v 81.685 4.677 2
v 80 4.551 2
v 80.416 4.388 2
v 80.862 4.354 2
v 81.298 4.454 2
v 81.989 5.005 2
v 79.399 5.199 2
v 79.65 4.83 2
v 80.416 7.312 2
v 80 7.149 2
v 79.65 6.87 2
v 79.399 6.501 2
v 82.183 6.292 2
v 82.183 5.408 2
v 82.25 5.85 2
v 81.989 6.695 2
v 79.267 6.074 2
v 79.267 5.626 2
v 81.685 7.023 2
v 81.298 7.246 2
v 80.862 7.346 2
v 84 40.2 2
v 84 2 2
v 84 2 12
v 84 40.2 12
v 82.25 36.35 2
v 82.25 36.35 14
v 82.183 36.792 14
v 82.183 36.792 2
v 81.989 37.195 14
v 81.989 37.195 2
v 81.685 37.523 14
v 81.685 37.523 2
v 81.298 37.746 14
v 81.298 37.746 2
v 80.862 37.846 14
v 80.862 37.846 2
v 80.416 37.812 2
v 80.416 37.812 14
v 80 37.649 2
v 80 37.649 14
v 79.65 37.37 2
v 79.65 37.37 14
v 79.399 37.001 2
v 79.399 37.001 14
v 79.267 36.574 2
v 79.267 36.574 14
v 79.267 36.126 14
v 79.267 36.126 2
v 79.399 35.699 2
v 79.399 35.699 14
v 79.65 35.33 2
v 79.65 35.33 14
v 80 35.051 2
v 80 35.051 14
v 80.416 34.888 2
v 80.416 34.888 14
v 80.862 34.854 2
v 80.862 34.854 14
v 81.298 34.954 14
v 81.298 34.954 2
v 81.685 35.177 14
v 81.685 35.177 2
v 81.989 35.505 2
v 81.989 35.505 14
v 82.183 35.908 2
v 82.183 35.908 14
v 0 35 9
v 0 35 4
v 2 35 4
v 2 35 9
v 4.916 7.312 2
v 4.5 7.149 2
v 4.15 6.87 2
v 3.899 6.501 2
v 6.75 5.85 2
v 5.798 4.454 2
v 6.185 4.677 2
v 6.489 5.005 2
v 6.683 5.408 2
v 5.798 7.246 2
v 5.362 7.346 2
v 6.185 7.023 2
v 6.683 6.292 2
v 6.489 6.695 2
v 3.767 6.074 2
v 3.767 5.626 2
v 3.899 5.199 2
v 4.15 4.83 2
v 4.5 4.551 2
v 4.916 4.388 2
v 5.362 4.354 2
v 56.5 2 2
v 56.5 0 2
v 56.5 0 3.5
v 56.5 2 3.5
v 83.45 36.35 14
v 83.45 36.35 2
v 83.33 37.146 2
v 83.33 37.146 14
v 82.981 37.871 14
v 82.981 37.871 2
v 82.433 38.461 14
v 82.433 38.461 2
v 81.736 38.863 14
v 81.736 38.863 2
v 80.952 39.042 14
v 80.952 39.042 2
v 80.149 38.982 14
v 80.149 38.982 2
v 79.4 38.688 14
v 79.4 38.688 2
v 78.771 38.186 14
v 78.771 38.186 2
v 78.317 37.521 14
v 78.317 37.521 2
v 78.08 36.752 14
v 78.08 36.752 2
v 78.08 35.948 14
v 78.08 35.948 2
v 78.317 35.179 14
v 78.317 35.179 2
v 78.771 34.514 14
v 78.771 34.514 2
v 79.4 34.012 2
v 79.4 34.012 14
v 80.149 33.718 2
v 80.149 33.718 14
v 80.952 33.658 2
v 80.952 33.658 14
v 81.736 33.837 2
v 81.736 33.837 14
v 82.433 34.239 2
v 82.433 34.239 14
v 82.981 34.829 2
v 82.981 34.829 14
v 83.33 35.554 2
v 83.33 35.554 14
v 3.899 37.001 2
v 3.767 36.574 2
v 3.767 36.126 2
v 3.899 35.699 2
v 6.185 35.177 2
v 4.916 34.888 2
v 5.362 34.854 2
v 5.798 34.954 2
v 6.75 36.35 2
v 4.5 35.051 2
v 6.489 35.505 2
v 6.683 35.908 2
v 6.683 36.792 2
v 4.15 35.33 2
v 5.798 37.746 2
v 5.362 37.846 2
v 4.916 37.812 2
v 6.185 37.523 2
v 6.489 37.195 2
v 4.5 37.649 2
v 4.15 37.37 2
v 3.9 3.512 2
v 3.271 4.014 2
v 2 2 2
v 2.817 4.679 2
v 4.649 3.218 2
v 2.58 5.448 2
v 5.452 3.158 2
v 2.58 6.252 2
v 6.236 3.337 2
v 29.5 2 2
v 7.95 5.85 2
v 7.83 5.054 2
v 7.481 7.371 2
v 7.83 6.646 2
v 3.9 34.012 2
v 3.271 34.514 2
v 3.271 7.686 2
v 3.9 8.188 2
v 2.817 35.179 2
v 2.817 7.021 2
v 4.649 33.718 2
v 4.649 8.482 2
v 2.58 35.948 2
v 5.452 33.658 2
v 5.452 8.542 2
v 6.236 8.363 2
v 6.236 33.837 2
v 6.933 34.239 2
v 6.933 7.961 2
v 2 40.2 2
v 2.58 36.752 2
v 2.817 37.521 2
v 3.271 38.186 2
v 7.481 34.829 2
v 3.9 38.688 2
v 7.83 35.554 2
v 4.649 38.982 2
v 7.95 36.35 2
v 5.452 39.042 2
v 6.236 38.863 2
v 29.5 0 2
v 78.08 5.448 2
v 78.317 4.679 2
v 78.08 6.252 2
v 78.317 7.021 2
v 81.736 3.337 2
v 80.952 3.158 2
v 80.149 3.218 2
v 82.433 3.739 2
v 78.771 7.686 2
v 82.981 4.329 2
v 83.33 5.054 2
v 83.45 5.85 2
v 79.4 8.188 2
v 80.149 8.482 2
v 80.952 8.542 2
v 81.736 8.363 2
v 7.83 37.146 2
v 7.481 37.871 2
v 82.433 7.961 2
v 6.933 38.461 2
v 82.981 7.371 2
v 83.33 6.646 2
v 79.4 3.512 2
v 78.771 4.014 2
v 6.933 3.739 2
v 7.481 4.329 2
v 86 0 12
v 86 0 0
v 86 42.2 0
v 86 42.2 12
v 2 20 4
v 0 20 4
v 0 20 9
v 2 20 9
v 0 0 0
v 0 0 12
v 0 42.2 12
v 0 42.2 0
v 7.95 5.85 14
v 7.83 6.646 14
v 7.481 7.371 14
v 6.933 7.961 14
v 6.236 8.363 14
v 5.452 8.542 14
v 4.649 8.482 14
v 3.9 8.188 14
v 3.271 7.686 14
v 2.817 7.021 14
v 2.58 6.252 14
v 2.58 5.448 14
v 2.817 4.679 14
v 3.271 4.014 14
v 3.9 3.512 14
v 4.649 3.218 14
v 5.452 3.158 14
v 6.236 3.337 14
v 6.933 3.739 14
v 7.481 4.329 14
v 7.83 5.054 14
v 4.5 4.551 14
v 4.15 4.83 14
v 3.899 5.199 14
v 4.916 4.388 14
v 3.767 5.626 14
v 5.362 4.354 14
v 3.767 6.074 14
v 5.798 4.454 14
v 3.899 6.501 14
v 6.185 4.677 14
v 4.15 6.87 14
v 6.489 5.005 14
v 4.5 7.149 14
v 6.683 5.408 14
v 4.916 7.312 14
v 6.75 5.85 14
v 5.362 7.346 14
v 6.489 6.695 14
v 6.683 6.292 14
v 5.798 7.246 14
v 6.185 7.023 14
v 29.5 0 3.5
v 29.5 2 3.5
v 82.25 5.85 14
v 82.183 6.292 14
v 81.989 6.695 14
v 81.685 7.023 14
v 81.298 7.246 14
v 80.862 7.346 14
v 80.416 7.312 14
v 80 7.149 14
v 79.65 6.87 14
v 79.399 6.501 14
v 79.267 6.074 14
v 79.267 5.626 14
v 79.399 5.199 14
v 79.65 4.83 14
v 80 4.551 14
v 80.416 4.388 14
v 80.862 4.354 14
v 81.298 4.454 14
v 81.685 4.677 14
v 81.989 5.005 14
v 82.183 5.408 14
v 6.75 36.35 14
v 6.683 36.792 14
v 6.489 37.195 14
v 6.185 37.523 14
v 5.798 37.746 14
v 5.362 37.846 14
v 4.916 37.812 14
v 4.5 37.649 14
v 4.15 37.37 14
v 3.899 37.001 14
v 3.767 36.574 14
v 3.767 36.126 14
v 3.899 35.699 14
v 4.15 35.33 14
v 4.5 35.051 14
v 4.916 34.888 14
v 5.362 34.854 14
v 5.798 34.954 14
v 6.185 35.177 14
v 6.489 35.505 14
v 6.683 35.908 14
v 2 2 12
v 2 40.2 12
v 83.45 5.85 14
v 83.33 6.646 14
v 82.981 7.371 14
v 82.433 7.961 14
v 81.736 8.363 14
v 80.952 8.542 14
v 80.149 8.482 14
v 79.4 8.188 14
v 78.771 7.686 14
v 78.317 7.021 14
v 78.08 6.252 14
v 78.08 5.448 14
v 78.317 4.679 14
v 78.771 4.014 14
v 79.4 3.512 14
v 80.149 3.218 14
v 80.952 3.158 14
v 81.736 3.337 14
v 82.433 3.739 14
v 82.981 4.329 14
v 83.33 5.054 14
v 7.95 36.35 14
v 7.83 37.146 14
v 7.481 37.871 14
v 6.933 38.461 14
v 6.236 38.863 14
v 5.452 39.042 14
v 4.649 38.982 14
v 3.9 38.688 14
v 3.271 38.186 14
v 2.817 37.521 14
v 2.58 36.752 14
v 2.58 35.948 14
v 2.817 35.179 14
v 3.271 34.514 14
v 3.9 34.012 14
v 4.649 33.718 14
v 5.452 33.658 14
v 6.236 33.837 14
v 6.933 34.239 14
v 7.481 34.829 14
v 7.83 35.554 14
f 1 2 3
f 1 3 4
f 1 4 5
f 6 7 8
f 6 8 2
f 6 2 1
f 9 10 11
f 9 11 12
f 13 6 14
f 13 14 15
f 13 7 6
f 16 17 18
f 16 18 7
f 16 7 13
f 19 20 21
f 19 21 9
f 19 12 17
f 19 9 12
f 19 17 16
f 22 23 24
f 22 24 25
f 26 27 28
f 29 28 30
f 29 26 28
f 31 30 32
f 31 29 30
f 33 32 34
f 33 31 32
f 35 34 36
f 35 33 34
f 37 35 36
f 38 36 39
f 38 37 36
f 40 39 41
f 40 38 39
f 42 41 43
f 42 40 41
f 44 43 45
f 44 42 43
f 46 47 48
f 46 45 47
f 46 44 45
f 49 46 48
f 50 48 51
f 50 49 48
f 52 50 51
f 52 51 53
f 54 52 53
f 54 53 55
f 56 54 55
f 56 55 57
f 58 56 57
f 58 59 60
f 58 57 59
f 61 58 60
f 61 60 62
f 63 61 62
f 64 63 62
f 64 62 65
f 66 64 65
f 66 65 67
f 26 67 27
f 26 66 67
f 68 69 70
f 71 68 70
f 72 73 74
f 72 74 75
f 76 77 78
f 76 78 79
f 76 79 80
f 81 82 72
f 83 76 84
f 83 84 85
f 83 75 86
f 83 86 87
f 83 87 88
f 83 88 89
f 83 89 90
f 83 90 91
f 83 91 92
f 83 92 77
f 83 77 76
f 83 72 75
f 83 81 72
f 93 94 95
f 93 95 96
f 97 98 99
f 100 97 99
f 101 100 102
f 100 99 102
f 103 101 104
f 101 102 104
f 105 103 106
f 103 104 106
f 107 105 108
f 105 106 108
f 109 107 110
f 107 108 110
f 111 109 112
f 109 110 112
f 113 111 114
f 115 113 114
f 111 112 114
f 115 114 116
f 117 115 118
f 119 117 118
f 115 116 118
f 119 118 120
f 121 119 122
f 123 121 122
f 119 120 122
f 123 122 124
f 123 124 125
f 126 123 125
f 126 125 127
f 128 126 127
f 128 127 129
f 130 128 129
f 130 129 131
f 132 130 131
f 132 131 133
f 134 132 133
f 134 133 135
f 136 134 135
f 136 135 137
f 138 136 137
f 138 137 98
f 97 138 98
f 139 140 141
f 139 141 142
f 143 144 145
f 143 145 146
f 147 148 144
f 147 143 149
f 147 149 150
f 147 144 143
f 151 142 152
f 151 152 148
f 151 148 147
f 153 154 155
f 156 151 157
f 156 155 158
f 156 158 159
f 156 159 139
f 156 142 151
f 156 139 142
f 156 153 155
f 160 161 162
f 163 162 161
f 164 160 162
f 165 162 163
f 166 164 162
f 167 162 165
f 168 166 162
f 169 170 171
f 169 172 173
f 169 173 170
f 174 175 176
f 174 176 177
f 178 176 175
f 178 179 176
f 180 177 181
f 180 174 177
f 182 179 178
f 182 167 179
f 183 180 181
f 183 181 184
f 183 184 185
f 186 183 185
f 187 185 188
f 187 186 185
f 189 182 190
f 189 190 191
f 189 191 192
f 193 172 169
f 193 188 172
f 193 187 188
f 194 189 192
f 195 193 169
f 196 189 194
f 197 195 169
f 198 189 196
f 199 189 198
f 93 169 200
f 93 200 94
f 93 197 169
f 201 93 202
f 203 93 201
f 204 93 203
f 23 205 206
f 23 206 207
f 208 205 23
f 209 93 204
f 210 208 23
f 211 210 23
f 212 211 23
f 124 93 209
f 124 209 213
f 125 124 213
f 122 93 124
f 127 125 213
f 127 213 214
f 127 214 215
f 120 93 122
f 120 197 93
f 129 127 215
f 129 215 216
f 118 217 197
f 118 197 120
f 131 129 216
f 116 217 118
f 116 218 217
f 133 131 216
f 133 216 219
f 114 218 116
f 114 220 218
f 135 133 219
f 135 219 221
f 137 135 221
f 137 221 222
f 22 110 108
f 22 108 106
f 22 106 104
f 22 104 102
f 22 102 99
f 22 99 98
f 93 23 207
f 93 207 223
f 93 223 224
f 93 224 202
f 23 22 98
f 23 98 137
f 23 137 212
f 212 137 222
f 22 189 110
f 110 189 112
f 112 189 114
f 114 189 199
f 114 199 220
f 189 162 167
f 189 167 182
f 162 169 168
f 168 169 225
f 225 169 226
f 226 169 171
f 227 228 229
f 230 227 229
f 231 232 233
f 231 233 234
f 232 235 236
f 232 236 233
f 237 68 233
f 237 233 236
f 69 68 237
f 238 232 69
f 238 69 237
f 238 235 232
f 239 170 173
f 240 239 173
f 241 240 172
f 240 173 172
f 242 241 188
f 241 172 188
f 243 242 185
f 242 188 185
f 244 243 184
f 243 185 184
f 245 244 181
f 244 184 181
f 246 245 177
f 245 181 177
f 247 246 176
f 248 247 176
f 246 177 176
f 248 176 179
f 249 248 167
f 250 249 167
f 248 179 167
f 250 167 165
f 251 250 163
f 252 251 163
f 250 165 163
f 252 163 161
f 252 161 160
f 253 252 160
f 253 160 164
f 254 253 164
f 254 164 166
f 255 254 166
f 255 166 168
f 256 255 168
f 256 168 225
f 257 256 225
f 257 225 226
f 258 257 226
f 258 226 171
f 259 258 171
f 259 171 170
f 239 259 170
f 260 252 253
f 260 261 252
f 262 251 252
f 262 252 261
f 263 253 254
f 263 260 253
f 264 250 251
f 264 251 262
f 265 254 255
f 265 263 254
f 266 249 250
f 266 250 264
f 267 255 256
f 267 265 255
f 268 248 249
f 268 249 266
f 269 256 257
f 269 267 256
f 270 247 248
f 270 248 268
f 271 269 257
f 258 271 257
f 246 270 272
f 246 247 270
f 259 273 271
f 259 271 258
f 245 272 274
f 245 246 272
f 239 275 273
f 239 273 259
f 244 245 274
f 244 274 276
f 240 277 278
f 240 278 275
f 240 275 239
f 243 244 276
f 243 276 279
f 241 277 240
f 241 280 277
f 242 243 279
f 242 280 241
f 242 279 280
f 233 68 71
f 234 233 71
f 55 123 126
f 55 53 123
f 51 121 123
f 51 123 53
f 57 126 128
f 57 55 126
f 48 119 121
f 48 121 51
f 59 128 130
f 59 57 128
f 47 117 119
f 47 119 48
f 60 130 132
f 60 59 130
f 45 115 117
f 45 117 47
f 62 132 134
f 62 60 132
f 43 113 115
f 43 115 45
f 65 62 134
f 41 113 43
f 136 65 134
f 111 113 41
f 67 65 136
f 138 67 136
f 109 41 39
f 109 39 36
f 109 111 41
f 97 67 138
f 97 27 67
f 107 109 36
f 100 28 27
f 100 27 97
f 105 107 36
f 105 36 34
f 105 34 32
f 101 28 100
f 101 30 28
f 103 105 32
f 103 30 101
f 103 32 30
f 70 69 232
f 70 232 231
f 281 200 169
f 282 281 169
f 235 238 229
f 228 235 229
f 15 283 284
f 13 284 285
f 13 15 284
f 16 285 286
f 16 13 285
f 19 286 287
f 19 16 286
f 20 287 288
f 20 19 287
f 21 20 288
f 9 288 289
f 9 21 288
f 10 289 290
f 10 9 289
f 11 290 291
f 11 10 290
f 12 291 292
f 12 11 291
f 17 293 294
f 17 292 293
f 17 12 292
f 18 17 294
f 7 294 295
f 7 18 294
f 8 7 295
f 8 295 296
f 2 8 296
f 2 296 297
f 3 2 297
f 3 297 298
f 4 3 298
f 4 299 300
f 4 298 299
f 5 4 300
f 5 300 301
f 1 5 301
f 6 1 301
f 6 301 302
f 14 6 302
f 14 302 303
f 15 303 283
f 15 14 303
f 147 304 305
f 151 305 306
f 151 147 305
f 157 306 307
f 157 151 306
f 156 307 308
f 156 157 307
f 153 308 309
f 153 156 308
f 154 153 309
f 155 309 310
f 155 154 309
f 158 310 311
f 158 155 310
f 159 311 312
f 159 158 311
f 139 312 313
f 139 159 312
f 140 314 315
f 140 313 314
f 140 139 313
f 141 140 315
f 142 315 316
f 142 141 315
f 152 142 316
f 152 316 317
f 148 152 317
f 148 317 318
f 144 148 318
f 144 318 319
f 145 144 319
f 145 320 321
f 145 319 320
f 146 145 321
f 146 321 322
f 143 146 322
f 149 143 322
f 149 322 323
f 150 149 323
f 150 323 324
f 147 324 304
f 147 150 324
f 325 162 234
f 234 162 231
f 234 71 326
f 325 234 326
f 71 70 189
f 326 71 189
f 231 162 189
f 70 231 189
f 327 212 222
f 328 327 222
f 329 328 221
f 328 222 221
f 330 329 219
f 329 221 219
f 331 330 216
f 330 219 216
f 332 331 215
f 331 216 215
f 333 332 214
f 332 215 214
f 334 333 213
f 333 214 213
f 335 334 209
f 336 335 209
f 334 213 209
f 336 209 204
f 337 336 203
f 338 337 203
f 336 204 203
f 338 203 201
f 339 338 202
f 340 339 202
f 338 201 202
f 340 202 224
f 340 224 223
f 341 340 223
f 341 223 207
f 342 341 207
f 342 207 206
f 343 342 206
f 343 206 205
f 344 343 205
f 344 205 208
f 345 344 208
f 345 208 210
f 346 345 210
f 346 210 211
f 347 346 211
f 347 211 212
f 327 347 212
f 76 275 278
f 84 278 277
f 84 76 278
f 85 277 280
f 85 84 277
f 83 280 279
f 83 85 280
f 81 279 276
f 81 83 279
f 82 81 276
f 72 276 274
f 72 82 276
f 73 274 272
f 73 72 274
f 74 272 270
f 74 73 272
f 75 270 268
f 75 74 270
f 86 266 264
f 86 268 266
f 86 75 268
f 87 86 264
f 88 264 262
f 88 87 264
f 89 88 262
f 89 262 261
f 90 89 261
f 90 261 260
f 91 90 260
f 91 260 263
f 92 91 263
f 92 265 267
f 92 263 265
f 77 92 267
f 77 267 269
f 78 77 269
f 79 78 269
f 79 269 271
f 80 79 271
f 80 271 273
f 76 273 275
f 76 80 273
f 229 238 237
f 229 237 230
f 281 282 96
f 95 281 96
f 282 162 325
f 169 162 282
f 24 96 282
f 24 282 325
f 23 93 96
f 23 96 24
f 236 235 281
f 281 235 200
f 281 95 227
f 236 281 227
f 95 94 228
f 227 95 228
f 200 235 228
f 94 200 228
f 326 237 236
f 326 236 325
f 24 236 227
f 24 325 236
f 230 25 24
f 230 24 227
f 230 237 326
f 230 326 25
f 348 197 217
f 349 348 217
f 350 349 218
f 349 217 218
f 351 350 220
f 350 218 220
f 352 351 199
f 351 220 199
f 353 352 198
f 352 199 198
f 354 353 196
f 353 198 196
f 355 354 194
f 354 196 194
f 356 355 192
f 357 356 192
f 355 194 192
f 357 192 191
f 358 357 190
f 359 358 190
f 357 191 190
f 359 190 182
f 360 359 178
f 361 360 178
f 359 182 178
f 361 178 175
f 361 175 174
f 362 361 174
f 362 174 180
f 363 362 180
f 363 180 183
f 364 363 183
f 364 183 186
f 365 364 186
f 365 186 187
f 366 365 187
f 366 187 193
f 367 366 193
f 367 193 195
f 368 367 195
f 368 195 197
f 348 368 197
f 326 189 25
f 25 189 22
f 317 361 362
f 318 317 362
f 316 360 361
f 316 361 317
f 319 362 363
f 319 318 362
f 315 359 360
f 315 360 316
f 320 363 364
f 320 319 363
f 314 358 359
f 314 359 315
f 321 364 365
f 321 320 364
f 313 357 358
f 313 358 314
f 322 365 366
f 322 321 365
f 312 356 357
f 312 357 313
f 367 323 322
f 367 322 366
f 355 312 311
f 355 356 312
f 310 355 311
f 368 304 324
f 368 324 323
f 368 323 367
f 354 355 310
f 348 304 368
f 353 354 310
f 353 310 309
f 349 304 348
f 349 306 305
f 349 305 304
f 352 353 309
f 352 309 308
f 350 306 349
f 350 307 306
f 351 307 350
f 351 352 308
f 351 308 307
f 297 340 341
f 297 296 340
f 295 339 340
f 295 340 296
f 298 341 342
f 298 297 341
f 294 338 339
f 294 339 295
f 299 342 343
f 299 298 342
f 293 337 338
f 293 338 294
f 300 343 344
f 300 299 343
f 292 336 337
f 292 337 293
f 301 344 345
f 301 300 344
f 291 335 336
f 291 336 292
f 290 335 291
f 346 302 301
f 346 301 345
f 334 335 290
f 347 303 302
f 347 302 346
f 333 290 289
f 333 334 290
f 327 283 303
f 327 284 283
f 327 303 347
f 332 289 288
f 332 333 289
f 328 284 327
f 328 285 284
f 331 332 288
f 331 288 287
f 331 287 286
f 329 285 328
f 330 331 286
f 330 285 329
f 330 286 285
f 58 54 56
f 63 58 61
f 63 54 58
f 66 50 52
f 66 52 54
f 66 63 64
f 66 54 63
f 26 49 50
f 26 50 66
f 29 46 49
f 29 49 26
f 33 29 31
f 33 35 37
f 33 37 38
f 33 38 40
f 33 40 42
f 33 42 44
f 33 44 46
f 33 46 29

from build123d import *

# Parameters (mm, degrees)
BOX006_W        = 86
BOX006_H        = 42.2
BOX006_DEPTH    = 12
BOX007_W        = 82
BOX007_H        = 38.2
BOX007_DEPTH    = 10
SKETCH020_R     = 2.7
PAD016_DEPTH    = 14
SKETCH021_R     = 1.5
POCKET003_DEPTH = 14
BOX008_W        = 2
BOX008_H        = 15
BOX008_DEPTH    = 5
BOX009_W        = 27
BOX009_H        = 2
BOX009_DEPTH    = 1.5


with BuildPart() as part:
    # Box006 → Box006 (join)
    with BuildSketch(Plane.XY):
        with Locations((43, 21.1)):
            Rectangle(BOX006_W, BOX006_H)
    extrude(amount=BOX006_DEPTH)

    # Box007 → Box007 (cut)
    with BuildSketch(Plane(origin=(2, 2, 2), x_dir=(1, 0, 0), z_dir=(0, 0, 1))):
        with Locations((41, 19.1)):
            Rectangle(BOX007_W, BOX007_H)
    extrude(amount=BOX007_DEPTH, mode=Mode.SUBTRACT)

    # Sketch020 → Pad016 (join)
    with BuildSketch(Plane.XY):
        with Locations((5.25, 36.35)):
            Circle(SKETCH020_R)
        with Locations((80.75, 36.35)):
            Circle(SKETCH020_R)
        with Locations((80.75, 5.85)):
            Circle(SKETCH020_R)
        with Locations((5.25, 5.85)):
            Circle(SKETCH020_R)
    extrude(amount=PAD016_DEPTH)

    # Sketch021 → Pocket003 (cut)
    with BuildSketch(Plane.XY.offset(2)):
        with Locations((5.25, 36.35)):
            Circle(SKETCH021_R)
        with Locations((80.75, 36.35)):
            Circle(SKETCH021_R)
        with Locations((80.75, 5.85)):
            Circle(SKETCH021_R)
        with Locations((5.25, 5.85)):
            Circle(SKETCH021_R)
    extrude(amount=POCKET003_DEPTH, mode=Mode.SUBTRACT)

    # Box008 → Box008 (cut)
    with BuildSketch(Plane(origin=(0, 20, 4), x_dir=(1, 0, 0), z_dir=(0, 0, 1))):
        with Locations((1, 7.5)):
            Rectangle(BOX008_W, BOX008_H)
    extrude(amount=BOX008_DEPTH, mode=Mode.SUBTRACT)

    # Box009 → Box009 (cut)
    with BuildSketch(Plane(origin=(29.5, 0, 2), x_dir=(1, 0, 0), z_dir=(0, 0, 1))):
        with Locations((13.5, 1)):
            Rectangle(BOX009_W, BOX009_H)
    extrude(amount=BOX009_DEPTH, mode=Mode.SUBTRACT)


solid = part.part
